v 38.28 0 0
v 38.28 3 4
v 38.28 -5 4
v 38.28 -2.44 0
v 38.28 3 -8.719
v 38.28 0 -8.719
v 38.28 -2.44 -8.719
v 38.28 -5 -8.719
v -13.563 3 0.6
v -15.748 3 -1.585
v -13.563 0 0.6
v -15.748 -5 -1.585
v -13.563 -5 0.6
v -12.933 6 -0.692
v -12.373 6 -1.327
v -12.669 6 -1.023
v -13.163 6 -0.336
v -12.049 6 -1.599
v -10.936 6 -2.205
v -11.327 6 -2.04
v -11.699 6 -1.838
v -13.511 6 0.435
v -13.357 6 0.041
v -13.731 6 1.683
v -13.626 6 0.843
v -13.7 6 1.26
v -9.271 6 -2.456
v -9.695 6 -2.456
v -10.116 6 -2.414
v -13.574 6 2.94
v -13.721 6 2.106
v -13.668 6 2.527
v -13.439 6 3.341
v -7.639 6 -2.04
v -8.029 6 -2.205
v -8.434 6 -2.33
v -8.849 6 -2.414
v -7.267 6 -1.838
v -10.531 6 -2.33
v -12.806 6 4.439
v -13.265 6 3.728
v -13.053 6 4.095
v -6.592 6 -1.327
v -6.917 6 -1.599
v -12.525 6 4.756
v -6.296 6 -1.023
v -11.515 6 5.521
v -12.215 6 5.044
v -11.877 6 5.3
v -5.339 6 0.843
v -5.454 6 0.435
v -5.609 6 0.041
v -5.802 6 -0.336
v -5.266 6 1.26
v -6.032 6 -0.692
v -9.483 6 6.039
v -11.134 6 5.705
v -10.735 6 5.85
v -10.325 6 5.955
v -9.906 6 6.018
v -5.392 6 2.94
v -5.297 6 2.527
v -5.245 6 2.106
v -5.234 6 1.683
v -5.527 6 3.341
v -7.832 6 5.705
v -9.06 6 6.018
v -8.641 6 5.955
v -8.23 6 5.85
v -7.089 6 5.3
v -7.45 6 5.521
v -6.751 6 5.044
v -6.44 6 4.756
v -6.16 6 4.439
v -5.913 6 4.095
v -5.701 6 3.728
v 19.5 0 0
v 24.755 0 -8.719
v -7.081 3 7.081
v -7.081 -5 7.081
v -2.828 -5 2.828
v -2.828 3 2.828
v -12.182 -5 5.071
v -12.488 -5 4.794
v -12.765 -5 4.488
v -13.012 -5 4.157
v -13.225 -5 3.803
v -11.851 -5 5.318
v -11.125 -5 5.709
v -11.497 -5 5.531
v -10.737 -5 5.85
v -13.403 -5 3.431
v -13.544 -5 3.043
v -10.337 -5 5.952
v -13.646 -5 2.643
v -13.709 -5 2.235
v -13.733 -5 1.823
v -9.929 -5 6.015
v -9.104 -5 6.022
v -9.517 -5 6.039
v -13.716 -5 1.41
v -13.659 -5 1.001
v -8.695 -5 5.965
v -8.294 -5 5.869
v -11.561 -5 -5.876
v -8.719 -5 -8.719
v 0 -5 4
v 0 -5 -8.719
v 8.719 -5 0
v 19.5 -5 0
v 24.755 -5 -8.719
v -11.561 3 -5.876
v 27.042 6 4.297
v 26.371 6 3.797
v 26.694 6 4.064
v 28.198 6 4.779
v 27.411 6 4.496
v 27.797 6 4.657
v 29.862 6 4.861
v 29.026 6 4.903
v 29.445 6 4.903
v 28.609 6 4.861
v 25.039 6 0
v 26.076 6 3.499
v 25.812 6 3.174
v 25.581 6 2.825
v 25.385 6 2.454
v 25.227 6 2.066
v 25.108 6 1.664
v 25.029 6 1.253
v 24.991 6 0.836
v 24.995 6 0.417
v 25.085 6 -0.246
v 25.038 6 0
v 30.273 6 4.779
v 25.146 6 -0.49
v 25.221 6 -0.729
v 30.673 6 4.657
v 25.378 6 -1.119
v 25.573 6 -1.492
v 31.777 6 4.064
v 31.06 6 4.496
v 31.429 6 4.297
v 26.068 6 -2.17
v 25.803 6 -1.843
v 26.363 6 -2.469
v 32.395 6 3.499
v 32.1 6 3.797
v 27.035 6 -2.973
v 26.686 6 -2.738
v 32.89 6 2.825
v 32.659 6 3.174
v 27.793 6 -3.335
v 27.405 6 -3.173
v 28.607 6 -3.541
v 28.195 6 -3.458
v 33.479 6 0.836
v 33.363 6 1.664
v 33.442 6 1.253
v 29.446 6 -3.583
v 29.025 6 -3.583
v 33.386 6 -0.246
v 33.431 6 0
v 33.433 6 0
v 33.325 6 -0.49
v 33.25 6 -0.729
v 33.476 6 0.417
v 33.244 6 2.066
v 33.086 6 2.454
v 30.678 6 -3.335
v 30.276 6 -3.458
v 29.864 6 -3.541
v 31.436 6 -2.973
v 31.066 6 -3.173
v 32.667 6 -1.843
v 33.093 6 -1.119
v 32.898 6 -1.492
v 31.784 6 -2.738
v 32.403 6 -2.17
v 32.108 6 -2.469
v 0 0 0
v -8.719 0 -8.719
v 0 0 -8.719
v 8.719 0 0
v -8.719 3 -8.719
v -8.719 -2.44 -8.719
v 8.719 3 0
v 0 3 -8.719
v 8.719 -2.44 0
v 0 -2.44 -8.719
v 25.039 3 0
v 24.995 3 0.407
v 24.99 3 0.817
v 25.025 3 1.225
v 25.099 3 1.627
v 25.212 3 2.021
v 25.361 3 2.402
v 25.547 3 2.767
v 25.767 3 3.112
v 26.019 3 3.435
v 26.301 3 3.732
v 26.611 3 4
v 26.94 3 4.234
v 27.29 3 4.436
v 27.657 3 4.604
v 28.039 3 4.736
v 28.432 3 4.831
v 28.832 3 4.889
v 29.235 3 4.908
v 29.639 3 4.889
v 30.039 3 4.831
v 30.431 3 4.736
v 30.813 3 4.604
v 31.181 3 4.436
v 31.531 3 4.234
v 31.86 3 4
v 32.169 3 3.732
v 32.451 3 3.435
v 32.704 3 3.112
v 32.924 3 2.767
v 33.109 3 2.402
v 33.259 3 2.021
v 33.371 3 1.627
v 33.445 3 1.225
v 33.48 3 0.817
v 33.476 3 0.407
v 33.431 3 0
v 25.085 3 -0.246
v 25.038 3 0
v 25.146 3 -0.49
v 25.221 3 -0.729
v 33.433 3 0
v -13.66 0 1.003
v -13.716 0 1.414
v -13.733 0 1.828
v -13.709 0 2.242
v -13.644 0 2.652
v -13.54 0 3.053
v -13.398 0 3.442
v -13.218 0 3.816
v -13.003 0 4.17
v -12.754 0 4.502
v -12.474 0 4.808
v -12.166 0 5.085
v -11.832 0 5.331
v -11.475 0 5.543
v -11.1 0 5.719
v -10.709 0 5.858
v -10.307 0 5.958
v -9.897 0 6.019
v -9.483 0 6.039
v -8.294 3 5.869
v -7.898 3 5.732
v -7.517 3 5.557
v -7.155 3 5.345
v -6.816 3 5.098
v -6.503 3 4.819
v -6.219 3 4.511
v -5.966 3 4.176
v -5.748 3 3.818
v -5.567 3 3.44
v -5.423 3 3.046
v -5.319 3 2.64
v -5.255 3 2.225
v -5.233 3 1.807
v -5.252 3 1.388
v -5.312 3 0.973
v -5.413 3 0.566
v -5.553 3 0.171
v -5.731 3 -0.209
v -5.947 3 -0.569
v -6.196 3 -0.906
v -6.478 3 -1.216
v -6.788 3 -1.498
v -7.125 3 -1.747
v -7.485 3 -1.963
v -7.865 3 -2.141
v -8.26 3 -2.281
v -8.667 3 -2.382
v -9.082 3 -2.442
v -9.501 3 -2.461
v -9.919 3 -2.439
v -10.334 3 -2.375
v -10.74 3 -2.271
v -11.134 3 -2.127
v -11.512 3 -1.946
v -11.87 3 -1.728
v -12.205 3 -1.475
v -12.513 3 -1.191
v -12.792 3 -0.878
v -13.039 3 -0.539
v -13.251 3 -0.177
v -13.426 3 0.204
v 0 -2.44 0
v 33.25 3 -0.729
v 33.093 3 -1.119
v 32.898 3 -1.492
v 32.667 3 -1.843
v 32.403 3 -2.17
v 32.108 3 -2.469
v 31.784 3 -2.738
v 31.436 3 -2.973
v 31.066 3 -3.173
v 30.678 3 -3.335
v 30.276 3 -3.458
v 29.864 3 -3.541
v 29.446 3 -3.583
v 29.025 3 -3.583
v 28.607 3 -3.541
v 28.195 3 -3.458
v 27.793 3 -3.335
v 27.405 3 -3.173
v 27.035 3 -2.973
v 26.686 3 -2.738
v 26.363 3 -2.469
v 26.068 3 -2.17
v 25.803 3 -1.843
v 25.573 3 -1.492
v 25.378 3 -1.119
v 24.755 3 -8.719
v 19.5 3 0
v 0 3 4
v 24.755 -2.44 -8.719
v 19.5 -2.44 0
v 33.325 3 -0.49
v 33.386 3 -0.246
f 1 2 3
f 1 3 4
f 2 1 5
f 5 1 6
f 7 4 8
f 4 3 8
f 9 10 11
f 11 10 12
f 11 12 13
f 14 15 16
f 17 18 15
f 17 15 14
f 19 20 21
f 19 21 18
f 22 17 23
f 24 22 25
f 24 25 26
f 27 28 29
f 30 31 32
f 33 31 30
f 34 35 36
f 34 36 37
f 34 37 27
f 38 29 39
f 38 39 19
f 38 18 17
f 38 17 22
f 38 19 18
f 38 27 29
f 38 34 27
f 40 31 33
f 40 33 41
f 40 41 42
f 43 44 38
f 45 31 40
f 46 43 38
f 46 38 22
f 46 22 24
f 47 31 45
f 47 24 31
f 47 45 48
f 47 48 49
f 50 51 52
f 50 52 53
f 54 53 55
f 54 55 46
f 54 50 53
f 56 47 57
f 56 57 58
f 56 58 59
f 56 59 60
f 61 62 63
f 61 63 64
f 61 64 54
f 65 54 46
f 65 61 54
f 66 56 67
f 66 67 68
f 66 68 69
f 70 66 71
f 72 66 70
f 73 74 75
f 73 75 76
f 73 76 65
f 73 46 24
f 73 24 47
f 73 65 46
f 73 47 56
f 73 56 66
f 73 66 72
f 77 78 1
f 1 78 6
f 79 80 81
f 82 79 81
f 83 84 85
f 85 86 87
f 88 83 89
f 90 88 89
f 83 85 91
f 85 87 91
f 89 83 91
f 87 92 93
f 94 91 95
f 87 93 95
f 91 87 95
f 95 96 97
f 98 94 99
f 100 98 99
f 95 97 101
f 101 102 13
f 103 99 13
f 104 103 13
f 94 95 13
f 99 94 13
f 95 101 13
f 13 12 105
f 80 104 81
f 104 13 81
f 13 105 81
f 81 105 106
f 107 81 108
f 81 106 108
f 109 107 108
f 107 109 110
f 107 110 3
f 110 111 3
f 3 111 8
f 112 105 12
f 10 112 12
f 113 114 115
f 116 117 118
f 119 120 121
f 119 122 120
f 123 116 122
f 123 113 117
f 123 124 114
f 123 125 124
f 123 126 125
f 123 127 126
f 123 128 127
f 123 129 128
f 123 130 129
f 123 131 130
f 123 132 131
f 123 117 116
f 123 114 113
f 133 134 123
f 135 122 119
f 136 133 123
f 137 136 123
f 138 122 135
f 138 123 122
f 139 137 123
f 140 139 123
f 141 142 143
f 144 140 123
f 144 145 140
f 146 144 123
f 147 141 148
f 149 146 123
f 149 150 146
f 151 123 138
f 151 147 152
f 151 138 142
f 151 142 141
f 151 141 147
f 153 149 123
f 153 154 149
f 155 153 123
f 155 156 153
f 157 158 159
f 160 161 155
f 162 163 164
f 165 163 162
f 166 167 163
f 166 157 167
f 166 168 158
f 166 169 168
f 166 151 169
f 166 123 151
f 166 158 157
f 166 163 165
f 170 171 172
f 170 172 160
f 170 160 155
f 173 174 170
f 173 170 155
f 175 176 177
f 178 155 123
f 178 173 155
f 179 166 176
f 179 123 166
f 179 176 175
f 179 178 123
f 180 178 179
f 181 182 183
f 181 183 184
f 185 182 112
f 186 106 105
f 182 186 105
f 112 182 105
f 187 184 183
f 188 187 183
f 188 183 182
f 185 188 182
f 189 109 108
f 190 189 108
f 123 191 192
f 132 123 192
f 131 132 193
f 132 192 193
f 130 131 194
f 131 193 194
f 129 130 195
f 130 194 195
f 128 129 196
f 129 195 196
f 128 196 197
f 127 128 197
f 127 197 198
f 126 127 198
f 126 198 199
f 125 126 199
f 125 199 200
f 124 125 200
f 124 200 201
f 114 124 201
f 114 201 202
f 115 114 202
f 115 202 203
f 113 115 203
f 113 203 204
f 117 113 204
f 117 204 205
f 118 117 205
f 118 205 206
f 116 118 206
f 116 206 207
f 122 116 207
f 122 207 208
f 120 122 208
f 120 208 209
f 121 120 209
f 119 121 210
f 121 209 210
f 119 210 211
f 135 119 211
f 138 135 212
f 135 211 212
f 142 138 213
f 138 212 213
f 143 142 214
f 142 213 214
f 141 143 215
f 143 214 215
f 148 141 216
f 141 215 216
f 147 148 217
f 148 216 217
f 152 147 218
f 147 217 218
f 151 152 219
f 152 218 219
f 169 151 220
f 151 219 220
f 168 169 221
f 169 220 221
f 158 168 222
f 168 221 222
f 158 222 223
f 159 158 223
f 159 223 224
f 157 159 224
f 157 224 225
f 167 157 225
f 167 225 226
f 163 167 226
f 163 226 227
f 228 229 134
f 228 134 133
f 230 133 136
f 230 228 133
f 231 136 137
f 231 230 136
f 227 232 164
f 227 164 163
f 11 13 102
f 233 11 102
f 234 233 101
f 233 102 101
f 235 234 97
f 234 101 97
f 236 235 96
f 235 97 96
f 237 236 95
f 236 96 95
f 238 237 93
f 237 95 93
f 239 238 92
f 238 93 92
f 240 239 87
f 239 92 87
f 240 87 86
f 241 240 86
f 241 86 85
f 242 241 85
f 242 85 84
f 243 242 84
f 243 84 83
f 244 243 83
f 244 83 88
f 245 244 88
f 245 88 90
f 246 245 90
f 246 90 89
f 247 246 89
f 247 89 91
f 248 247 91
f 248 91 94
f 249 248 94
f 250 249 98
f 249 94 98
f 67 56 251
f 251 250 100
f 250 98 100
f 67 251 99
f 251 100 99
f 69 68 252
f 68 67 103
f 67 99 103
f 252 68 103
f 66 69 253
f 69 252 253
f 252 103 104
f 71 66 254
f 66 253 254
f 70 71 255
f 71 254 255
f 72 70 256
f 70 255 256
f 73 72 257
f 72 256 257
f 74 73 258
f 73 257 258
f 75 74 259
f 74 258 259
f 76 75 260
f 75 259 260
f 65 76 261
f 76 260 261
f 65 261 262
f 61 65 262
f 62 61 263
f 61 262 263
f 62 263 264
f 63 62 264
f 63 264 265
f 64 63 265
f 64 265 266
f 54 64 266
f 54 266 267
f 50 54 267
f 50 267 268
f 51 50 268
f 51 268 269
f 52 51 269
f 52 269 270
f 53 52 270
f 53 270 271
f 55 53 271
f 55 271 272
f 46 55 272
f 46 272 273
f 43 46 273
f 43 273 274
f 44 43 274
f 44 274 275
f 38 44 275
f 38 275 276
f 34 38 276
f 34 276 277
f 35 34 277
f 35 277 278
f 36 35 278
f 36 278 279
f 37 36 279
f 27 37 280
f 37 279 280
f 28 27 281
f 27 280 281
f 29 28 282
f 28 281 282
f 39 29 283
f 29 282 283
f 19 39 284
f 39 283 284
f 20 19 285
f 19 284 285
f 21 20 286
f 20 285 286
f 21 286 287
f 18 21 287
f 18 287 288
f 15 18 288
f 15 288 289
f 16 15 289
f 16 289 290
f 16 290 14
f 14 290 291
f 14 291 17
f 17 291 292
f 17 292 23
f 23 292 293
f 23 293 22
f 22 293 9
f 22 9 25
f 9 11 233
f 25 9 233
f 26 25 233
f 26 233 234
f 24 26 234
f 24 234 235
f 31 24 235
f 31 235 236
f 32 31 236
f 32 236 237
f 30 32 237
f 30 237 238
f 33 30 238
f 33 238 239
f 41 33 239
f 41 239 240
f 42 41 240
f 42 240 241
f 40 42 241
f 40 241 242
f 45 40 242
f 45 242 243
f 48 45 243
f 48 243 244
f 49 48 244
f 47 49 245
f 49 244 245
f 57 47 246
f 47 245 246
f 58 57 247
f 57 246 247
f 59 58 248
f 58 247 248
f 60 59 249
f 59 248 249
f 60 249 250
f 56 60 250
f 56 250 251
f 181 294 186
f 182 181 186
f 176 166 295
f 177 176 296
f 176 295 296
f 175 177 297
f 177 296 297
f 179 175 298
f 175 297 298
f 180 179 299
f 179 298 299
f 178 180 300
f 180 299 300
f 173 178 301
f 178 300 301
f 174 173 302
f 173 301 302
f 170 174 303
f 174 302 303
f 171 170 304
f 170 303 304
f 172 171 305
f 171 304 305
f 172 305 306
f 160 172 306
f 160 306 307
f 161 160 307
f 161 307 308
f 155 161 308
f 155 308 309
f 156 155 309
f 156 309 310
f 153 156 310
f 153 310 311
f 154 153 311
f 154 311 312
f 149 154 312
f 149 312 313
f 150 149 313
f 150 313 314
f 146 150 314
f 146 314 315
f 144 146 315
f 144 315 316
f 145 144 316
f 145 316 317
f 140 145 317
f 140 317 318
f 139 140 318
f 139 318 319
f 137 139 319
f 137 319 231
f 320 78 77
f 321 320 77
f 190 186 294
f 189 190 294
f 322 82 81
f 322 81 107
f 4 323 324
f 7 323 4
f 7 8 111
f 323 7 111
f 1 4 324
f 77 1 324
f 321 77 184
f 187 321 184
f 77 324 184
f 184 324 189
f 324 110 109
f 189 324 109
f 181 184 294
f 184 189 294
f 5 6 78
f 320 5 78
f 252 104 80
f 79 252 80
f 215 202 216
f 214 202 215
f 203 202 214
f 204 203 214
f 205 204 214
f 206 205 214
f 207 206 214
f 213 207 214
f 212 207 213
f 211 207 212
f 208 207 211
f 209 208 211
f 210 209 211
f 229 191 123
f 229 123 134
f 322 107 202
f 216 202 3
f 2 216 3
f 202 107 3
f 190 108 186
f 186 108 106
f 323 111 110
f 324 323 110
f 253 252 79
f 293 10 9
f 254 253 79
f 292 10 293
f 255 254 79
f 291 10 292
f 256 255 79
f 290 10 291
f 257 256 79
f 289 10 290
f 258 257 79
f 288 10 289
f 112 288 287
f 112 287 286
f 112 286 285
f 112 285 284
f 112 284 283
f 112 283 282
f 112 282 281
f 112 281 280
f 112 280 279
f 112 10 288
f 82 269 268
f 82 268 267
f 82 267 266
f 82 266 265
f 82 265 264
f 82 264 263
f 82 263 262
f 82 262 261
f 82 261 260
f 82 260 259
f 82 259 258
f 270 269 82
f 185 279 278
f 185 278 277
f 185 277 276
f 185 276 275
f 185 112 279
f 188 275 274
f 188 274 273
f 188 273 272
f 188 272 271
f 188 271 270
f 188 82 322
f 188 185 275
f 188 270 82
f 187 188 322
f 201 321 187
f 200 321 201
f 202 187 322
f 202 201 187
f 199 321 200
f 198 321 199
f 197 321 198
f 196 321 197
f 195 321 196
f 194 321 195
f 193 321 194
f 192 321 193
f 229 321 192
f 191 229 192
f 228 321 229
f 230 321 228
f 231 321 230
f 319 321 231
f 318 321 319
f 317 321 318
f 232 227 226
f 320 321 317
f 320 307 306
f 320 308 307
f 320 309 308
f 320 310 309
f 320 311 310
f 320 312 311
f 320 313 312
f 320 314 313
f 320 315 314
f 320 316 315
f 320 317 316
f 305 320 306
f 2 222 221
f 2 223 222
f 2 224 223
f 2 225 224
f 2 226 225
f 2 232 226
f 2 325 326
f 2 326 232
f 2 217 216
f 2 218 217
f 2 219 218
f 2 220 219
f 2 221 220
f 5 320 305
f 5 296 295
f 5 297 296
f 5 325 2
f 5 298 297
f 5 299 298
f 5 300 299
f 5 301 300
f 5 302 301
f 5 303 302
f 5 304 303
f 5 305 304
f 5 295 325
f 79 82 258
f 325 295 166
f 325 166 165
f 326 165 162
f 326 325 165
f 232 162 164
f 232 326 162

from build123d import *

# Parameters (mm, degrees)
BOSS_EXTRUDE1_DEPTH   = 6
SKETCH2_R             = 4.25
BOSS_EXTRUDE1_2_DEPTH = 6
BOSS_EXTRUDE2_DEPTH   = 3
BOSS_EXTRUDE3_START   = -5
BOSS_EXTRUDE3_DEPTH   = 5
BOSS_EXTRUDE4_DEPTH   = 2.56
SKETCH4_R             = 4.247751339
BOSS_EXTRUDE5_DEPTH   = 3


with BuildPart() as part:
    # Sketch2 → Boss-Extrude1 (new body)
    with BuildSketch(Plane(origin=(0, 0, 0), x_dir=(1, 0, 0), z_dir=(0, 1, 0))):
        with BuildLine():
            ThreePointArc((33.43268592, 0), (29.235330072, 3.583138785), (25.037974223, 0))
            Line((25.037974223, 0), (33.43268592, 0))
        make_face()
    extrude(amount=BOSS_EXTRUDE1_DEPTH)



with BuildPart() as body_2:
    # Sketch2 → Boss-Extrude1 2 (new body)
    with BuildSketch(Plane(origin=(0, 0, 0), x_dir=(1, 0, 0), z_dir=(0, 1, 0))):
        with Locations((-9.482754905, -1.788781285)):
            Circle(SKETCH2_R)
    extrude(amount=BOSS_EXTRUDE1_2_DEPTH)


with BuildPart() as part_1:
    add(part.part)

    add(body_2.part)  # Boss-Extrude2 merges body 2
    # Sketch2<7> → Boss-Extrude2 (add)
    with BuildSketch(Plane(origin=(0, 0, 0), x_dir=(1, 0, 0), z_dir=(0, 1, 0))):
        with BuildLine():
            Line((0, 8.718626612), (-8.718626612, 8.718626612))
            Line((-8.718626612, 8.718626612), (-11.561455819, 5.875797405))
            Line((-11.561455819, 5.875797405), (-15.748205688, 1.58521084))
            Line((-15.748205688, 1.58521084), (-13.563084148, -0.5999107))
            ThreePointArc((-13.563084148, -0.5999107), (-6.477551085, 1.216422535), (-8.29388432, -5.869110529))
            Line((-8.29388432, -5.869110529), (-7.081497424, -7.081497424))
            Line((-7.081497424, -7.081497424), (-2.828427125, -2.828427125))
            Line((-2.828427125, -2.828427125), (0, -4))
            Line((0, -4), (38.28, -4))
            Line((38.28, -4), (38.28, 8.718626612))
            Line((38.28, 8.718626612), (24.755242586, 8.718626612))
            Line((24.755242586, 8.718626612), (19.499755178, 0))
            Line((19.499755178, 0), (8.718626612, 0))
            Line((8.718626612, 0), (0, 8.718626612))
        make_face()
        with BuildLine():
            Line((33.43268592, 0), (25.037974223, 0))
            ThreePointArc((25.037974223, 0), (29.235330072, 3.583138785), (33.43268592, 0))
        make_face(mode=Mode.SUBTRACT)
    extrude(amount=BOSS_EXTRUDE2_DEPTH)

    # Sketch2<9> → Boss-Extrude3 (add)
    with BuildSketch(Plane(origin=(0, 0, 0), x_dir=(1, 0, 0), z_dir=(0, 1, 0)).offset(BOSS_EXTRUDE3_START)):
        with BuildLine():
            Line((0, 0), (-8.718626612, 8.718626612))
            Line((-8.718626612, 8.718626612), (-11.561455819, 5.875797405))
            Line((-11.561455819, 5.875797405), (-15.748205688, 1.58521084))
            Line((-15.748205688, 1.58521084), (-13.563084148, -0.5999107))
            ThreePointArc((-13.563084148, -0.5999107), (-12.487958725, -4.793985106), (-8.29388432, -5.869110529))
            Line((-8.29388432, -5.869110529), (-7.081497424, -7.081497424))
            Line((-7.081497424, -7.081497424), (-2.828427125, -2.828427125))
            Line((-2.828427125, -2.828427125), (0, -4))
            Line((0, -4), (38.28, -4))
            Line((38.28, -4), (38.28, 0))
            Line((38.28, 0), (0, 0))
        make_face()
    extrude(amount=BOSS_EXTRUDE3_DEPTH)

    # Sketch3 → Boss-Extrude4 (add)
    with BuildSketch(Plane(origin=(0, -5, 0), x_dir=(-1, 0, 0), z_dir=(0, -1, 0))):
        Polygon((-38.28, -4), (-38.28, 8.718626612), (-24.755242586, 8.718626612), (-19.499755178, 0), (-8.718626612, 0), (0, 8.718626612), (8.718626612, 8.718626612), (15.748205688, 1.58521084), (13.563084148, -0.5999107), (7.081497424, -7.081497424), (2.828427125, -2.828427125), (0, -4), align=None)
    extrude(amount=-BOSS_EXTRUDE4_DEPTH)

    # Sketch4 → Boss-Extrude5 (add)
    with BuildSketch(Plane(origin=(0, 3, 0), x_dir=(1, 0, 0), z_dir=(0, 1, 0))):
        with Locations((29.235330072, -0.66)):
            Circle(SKETCH4_R)
    extrude(amount=BOSS_EXTRUDE5_DEPTH)


solid = part_1.part
